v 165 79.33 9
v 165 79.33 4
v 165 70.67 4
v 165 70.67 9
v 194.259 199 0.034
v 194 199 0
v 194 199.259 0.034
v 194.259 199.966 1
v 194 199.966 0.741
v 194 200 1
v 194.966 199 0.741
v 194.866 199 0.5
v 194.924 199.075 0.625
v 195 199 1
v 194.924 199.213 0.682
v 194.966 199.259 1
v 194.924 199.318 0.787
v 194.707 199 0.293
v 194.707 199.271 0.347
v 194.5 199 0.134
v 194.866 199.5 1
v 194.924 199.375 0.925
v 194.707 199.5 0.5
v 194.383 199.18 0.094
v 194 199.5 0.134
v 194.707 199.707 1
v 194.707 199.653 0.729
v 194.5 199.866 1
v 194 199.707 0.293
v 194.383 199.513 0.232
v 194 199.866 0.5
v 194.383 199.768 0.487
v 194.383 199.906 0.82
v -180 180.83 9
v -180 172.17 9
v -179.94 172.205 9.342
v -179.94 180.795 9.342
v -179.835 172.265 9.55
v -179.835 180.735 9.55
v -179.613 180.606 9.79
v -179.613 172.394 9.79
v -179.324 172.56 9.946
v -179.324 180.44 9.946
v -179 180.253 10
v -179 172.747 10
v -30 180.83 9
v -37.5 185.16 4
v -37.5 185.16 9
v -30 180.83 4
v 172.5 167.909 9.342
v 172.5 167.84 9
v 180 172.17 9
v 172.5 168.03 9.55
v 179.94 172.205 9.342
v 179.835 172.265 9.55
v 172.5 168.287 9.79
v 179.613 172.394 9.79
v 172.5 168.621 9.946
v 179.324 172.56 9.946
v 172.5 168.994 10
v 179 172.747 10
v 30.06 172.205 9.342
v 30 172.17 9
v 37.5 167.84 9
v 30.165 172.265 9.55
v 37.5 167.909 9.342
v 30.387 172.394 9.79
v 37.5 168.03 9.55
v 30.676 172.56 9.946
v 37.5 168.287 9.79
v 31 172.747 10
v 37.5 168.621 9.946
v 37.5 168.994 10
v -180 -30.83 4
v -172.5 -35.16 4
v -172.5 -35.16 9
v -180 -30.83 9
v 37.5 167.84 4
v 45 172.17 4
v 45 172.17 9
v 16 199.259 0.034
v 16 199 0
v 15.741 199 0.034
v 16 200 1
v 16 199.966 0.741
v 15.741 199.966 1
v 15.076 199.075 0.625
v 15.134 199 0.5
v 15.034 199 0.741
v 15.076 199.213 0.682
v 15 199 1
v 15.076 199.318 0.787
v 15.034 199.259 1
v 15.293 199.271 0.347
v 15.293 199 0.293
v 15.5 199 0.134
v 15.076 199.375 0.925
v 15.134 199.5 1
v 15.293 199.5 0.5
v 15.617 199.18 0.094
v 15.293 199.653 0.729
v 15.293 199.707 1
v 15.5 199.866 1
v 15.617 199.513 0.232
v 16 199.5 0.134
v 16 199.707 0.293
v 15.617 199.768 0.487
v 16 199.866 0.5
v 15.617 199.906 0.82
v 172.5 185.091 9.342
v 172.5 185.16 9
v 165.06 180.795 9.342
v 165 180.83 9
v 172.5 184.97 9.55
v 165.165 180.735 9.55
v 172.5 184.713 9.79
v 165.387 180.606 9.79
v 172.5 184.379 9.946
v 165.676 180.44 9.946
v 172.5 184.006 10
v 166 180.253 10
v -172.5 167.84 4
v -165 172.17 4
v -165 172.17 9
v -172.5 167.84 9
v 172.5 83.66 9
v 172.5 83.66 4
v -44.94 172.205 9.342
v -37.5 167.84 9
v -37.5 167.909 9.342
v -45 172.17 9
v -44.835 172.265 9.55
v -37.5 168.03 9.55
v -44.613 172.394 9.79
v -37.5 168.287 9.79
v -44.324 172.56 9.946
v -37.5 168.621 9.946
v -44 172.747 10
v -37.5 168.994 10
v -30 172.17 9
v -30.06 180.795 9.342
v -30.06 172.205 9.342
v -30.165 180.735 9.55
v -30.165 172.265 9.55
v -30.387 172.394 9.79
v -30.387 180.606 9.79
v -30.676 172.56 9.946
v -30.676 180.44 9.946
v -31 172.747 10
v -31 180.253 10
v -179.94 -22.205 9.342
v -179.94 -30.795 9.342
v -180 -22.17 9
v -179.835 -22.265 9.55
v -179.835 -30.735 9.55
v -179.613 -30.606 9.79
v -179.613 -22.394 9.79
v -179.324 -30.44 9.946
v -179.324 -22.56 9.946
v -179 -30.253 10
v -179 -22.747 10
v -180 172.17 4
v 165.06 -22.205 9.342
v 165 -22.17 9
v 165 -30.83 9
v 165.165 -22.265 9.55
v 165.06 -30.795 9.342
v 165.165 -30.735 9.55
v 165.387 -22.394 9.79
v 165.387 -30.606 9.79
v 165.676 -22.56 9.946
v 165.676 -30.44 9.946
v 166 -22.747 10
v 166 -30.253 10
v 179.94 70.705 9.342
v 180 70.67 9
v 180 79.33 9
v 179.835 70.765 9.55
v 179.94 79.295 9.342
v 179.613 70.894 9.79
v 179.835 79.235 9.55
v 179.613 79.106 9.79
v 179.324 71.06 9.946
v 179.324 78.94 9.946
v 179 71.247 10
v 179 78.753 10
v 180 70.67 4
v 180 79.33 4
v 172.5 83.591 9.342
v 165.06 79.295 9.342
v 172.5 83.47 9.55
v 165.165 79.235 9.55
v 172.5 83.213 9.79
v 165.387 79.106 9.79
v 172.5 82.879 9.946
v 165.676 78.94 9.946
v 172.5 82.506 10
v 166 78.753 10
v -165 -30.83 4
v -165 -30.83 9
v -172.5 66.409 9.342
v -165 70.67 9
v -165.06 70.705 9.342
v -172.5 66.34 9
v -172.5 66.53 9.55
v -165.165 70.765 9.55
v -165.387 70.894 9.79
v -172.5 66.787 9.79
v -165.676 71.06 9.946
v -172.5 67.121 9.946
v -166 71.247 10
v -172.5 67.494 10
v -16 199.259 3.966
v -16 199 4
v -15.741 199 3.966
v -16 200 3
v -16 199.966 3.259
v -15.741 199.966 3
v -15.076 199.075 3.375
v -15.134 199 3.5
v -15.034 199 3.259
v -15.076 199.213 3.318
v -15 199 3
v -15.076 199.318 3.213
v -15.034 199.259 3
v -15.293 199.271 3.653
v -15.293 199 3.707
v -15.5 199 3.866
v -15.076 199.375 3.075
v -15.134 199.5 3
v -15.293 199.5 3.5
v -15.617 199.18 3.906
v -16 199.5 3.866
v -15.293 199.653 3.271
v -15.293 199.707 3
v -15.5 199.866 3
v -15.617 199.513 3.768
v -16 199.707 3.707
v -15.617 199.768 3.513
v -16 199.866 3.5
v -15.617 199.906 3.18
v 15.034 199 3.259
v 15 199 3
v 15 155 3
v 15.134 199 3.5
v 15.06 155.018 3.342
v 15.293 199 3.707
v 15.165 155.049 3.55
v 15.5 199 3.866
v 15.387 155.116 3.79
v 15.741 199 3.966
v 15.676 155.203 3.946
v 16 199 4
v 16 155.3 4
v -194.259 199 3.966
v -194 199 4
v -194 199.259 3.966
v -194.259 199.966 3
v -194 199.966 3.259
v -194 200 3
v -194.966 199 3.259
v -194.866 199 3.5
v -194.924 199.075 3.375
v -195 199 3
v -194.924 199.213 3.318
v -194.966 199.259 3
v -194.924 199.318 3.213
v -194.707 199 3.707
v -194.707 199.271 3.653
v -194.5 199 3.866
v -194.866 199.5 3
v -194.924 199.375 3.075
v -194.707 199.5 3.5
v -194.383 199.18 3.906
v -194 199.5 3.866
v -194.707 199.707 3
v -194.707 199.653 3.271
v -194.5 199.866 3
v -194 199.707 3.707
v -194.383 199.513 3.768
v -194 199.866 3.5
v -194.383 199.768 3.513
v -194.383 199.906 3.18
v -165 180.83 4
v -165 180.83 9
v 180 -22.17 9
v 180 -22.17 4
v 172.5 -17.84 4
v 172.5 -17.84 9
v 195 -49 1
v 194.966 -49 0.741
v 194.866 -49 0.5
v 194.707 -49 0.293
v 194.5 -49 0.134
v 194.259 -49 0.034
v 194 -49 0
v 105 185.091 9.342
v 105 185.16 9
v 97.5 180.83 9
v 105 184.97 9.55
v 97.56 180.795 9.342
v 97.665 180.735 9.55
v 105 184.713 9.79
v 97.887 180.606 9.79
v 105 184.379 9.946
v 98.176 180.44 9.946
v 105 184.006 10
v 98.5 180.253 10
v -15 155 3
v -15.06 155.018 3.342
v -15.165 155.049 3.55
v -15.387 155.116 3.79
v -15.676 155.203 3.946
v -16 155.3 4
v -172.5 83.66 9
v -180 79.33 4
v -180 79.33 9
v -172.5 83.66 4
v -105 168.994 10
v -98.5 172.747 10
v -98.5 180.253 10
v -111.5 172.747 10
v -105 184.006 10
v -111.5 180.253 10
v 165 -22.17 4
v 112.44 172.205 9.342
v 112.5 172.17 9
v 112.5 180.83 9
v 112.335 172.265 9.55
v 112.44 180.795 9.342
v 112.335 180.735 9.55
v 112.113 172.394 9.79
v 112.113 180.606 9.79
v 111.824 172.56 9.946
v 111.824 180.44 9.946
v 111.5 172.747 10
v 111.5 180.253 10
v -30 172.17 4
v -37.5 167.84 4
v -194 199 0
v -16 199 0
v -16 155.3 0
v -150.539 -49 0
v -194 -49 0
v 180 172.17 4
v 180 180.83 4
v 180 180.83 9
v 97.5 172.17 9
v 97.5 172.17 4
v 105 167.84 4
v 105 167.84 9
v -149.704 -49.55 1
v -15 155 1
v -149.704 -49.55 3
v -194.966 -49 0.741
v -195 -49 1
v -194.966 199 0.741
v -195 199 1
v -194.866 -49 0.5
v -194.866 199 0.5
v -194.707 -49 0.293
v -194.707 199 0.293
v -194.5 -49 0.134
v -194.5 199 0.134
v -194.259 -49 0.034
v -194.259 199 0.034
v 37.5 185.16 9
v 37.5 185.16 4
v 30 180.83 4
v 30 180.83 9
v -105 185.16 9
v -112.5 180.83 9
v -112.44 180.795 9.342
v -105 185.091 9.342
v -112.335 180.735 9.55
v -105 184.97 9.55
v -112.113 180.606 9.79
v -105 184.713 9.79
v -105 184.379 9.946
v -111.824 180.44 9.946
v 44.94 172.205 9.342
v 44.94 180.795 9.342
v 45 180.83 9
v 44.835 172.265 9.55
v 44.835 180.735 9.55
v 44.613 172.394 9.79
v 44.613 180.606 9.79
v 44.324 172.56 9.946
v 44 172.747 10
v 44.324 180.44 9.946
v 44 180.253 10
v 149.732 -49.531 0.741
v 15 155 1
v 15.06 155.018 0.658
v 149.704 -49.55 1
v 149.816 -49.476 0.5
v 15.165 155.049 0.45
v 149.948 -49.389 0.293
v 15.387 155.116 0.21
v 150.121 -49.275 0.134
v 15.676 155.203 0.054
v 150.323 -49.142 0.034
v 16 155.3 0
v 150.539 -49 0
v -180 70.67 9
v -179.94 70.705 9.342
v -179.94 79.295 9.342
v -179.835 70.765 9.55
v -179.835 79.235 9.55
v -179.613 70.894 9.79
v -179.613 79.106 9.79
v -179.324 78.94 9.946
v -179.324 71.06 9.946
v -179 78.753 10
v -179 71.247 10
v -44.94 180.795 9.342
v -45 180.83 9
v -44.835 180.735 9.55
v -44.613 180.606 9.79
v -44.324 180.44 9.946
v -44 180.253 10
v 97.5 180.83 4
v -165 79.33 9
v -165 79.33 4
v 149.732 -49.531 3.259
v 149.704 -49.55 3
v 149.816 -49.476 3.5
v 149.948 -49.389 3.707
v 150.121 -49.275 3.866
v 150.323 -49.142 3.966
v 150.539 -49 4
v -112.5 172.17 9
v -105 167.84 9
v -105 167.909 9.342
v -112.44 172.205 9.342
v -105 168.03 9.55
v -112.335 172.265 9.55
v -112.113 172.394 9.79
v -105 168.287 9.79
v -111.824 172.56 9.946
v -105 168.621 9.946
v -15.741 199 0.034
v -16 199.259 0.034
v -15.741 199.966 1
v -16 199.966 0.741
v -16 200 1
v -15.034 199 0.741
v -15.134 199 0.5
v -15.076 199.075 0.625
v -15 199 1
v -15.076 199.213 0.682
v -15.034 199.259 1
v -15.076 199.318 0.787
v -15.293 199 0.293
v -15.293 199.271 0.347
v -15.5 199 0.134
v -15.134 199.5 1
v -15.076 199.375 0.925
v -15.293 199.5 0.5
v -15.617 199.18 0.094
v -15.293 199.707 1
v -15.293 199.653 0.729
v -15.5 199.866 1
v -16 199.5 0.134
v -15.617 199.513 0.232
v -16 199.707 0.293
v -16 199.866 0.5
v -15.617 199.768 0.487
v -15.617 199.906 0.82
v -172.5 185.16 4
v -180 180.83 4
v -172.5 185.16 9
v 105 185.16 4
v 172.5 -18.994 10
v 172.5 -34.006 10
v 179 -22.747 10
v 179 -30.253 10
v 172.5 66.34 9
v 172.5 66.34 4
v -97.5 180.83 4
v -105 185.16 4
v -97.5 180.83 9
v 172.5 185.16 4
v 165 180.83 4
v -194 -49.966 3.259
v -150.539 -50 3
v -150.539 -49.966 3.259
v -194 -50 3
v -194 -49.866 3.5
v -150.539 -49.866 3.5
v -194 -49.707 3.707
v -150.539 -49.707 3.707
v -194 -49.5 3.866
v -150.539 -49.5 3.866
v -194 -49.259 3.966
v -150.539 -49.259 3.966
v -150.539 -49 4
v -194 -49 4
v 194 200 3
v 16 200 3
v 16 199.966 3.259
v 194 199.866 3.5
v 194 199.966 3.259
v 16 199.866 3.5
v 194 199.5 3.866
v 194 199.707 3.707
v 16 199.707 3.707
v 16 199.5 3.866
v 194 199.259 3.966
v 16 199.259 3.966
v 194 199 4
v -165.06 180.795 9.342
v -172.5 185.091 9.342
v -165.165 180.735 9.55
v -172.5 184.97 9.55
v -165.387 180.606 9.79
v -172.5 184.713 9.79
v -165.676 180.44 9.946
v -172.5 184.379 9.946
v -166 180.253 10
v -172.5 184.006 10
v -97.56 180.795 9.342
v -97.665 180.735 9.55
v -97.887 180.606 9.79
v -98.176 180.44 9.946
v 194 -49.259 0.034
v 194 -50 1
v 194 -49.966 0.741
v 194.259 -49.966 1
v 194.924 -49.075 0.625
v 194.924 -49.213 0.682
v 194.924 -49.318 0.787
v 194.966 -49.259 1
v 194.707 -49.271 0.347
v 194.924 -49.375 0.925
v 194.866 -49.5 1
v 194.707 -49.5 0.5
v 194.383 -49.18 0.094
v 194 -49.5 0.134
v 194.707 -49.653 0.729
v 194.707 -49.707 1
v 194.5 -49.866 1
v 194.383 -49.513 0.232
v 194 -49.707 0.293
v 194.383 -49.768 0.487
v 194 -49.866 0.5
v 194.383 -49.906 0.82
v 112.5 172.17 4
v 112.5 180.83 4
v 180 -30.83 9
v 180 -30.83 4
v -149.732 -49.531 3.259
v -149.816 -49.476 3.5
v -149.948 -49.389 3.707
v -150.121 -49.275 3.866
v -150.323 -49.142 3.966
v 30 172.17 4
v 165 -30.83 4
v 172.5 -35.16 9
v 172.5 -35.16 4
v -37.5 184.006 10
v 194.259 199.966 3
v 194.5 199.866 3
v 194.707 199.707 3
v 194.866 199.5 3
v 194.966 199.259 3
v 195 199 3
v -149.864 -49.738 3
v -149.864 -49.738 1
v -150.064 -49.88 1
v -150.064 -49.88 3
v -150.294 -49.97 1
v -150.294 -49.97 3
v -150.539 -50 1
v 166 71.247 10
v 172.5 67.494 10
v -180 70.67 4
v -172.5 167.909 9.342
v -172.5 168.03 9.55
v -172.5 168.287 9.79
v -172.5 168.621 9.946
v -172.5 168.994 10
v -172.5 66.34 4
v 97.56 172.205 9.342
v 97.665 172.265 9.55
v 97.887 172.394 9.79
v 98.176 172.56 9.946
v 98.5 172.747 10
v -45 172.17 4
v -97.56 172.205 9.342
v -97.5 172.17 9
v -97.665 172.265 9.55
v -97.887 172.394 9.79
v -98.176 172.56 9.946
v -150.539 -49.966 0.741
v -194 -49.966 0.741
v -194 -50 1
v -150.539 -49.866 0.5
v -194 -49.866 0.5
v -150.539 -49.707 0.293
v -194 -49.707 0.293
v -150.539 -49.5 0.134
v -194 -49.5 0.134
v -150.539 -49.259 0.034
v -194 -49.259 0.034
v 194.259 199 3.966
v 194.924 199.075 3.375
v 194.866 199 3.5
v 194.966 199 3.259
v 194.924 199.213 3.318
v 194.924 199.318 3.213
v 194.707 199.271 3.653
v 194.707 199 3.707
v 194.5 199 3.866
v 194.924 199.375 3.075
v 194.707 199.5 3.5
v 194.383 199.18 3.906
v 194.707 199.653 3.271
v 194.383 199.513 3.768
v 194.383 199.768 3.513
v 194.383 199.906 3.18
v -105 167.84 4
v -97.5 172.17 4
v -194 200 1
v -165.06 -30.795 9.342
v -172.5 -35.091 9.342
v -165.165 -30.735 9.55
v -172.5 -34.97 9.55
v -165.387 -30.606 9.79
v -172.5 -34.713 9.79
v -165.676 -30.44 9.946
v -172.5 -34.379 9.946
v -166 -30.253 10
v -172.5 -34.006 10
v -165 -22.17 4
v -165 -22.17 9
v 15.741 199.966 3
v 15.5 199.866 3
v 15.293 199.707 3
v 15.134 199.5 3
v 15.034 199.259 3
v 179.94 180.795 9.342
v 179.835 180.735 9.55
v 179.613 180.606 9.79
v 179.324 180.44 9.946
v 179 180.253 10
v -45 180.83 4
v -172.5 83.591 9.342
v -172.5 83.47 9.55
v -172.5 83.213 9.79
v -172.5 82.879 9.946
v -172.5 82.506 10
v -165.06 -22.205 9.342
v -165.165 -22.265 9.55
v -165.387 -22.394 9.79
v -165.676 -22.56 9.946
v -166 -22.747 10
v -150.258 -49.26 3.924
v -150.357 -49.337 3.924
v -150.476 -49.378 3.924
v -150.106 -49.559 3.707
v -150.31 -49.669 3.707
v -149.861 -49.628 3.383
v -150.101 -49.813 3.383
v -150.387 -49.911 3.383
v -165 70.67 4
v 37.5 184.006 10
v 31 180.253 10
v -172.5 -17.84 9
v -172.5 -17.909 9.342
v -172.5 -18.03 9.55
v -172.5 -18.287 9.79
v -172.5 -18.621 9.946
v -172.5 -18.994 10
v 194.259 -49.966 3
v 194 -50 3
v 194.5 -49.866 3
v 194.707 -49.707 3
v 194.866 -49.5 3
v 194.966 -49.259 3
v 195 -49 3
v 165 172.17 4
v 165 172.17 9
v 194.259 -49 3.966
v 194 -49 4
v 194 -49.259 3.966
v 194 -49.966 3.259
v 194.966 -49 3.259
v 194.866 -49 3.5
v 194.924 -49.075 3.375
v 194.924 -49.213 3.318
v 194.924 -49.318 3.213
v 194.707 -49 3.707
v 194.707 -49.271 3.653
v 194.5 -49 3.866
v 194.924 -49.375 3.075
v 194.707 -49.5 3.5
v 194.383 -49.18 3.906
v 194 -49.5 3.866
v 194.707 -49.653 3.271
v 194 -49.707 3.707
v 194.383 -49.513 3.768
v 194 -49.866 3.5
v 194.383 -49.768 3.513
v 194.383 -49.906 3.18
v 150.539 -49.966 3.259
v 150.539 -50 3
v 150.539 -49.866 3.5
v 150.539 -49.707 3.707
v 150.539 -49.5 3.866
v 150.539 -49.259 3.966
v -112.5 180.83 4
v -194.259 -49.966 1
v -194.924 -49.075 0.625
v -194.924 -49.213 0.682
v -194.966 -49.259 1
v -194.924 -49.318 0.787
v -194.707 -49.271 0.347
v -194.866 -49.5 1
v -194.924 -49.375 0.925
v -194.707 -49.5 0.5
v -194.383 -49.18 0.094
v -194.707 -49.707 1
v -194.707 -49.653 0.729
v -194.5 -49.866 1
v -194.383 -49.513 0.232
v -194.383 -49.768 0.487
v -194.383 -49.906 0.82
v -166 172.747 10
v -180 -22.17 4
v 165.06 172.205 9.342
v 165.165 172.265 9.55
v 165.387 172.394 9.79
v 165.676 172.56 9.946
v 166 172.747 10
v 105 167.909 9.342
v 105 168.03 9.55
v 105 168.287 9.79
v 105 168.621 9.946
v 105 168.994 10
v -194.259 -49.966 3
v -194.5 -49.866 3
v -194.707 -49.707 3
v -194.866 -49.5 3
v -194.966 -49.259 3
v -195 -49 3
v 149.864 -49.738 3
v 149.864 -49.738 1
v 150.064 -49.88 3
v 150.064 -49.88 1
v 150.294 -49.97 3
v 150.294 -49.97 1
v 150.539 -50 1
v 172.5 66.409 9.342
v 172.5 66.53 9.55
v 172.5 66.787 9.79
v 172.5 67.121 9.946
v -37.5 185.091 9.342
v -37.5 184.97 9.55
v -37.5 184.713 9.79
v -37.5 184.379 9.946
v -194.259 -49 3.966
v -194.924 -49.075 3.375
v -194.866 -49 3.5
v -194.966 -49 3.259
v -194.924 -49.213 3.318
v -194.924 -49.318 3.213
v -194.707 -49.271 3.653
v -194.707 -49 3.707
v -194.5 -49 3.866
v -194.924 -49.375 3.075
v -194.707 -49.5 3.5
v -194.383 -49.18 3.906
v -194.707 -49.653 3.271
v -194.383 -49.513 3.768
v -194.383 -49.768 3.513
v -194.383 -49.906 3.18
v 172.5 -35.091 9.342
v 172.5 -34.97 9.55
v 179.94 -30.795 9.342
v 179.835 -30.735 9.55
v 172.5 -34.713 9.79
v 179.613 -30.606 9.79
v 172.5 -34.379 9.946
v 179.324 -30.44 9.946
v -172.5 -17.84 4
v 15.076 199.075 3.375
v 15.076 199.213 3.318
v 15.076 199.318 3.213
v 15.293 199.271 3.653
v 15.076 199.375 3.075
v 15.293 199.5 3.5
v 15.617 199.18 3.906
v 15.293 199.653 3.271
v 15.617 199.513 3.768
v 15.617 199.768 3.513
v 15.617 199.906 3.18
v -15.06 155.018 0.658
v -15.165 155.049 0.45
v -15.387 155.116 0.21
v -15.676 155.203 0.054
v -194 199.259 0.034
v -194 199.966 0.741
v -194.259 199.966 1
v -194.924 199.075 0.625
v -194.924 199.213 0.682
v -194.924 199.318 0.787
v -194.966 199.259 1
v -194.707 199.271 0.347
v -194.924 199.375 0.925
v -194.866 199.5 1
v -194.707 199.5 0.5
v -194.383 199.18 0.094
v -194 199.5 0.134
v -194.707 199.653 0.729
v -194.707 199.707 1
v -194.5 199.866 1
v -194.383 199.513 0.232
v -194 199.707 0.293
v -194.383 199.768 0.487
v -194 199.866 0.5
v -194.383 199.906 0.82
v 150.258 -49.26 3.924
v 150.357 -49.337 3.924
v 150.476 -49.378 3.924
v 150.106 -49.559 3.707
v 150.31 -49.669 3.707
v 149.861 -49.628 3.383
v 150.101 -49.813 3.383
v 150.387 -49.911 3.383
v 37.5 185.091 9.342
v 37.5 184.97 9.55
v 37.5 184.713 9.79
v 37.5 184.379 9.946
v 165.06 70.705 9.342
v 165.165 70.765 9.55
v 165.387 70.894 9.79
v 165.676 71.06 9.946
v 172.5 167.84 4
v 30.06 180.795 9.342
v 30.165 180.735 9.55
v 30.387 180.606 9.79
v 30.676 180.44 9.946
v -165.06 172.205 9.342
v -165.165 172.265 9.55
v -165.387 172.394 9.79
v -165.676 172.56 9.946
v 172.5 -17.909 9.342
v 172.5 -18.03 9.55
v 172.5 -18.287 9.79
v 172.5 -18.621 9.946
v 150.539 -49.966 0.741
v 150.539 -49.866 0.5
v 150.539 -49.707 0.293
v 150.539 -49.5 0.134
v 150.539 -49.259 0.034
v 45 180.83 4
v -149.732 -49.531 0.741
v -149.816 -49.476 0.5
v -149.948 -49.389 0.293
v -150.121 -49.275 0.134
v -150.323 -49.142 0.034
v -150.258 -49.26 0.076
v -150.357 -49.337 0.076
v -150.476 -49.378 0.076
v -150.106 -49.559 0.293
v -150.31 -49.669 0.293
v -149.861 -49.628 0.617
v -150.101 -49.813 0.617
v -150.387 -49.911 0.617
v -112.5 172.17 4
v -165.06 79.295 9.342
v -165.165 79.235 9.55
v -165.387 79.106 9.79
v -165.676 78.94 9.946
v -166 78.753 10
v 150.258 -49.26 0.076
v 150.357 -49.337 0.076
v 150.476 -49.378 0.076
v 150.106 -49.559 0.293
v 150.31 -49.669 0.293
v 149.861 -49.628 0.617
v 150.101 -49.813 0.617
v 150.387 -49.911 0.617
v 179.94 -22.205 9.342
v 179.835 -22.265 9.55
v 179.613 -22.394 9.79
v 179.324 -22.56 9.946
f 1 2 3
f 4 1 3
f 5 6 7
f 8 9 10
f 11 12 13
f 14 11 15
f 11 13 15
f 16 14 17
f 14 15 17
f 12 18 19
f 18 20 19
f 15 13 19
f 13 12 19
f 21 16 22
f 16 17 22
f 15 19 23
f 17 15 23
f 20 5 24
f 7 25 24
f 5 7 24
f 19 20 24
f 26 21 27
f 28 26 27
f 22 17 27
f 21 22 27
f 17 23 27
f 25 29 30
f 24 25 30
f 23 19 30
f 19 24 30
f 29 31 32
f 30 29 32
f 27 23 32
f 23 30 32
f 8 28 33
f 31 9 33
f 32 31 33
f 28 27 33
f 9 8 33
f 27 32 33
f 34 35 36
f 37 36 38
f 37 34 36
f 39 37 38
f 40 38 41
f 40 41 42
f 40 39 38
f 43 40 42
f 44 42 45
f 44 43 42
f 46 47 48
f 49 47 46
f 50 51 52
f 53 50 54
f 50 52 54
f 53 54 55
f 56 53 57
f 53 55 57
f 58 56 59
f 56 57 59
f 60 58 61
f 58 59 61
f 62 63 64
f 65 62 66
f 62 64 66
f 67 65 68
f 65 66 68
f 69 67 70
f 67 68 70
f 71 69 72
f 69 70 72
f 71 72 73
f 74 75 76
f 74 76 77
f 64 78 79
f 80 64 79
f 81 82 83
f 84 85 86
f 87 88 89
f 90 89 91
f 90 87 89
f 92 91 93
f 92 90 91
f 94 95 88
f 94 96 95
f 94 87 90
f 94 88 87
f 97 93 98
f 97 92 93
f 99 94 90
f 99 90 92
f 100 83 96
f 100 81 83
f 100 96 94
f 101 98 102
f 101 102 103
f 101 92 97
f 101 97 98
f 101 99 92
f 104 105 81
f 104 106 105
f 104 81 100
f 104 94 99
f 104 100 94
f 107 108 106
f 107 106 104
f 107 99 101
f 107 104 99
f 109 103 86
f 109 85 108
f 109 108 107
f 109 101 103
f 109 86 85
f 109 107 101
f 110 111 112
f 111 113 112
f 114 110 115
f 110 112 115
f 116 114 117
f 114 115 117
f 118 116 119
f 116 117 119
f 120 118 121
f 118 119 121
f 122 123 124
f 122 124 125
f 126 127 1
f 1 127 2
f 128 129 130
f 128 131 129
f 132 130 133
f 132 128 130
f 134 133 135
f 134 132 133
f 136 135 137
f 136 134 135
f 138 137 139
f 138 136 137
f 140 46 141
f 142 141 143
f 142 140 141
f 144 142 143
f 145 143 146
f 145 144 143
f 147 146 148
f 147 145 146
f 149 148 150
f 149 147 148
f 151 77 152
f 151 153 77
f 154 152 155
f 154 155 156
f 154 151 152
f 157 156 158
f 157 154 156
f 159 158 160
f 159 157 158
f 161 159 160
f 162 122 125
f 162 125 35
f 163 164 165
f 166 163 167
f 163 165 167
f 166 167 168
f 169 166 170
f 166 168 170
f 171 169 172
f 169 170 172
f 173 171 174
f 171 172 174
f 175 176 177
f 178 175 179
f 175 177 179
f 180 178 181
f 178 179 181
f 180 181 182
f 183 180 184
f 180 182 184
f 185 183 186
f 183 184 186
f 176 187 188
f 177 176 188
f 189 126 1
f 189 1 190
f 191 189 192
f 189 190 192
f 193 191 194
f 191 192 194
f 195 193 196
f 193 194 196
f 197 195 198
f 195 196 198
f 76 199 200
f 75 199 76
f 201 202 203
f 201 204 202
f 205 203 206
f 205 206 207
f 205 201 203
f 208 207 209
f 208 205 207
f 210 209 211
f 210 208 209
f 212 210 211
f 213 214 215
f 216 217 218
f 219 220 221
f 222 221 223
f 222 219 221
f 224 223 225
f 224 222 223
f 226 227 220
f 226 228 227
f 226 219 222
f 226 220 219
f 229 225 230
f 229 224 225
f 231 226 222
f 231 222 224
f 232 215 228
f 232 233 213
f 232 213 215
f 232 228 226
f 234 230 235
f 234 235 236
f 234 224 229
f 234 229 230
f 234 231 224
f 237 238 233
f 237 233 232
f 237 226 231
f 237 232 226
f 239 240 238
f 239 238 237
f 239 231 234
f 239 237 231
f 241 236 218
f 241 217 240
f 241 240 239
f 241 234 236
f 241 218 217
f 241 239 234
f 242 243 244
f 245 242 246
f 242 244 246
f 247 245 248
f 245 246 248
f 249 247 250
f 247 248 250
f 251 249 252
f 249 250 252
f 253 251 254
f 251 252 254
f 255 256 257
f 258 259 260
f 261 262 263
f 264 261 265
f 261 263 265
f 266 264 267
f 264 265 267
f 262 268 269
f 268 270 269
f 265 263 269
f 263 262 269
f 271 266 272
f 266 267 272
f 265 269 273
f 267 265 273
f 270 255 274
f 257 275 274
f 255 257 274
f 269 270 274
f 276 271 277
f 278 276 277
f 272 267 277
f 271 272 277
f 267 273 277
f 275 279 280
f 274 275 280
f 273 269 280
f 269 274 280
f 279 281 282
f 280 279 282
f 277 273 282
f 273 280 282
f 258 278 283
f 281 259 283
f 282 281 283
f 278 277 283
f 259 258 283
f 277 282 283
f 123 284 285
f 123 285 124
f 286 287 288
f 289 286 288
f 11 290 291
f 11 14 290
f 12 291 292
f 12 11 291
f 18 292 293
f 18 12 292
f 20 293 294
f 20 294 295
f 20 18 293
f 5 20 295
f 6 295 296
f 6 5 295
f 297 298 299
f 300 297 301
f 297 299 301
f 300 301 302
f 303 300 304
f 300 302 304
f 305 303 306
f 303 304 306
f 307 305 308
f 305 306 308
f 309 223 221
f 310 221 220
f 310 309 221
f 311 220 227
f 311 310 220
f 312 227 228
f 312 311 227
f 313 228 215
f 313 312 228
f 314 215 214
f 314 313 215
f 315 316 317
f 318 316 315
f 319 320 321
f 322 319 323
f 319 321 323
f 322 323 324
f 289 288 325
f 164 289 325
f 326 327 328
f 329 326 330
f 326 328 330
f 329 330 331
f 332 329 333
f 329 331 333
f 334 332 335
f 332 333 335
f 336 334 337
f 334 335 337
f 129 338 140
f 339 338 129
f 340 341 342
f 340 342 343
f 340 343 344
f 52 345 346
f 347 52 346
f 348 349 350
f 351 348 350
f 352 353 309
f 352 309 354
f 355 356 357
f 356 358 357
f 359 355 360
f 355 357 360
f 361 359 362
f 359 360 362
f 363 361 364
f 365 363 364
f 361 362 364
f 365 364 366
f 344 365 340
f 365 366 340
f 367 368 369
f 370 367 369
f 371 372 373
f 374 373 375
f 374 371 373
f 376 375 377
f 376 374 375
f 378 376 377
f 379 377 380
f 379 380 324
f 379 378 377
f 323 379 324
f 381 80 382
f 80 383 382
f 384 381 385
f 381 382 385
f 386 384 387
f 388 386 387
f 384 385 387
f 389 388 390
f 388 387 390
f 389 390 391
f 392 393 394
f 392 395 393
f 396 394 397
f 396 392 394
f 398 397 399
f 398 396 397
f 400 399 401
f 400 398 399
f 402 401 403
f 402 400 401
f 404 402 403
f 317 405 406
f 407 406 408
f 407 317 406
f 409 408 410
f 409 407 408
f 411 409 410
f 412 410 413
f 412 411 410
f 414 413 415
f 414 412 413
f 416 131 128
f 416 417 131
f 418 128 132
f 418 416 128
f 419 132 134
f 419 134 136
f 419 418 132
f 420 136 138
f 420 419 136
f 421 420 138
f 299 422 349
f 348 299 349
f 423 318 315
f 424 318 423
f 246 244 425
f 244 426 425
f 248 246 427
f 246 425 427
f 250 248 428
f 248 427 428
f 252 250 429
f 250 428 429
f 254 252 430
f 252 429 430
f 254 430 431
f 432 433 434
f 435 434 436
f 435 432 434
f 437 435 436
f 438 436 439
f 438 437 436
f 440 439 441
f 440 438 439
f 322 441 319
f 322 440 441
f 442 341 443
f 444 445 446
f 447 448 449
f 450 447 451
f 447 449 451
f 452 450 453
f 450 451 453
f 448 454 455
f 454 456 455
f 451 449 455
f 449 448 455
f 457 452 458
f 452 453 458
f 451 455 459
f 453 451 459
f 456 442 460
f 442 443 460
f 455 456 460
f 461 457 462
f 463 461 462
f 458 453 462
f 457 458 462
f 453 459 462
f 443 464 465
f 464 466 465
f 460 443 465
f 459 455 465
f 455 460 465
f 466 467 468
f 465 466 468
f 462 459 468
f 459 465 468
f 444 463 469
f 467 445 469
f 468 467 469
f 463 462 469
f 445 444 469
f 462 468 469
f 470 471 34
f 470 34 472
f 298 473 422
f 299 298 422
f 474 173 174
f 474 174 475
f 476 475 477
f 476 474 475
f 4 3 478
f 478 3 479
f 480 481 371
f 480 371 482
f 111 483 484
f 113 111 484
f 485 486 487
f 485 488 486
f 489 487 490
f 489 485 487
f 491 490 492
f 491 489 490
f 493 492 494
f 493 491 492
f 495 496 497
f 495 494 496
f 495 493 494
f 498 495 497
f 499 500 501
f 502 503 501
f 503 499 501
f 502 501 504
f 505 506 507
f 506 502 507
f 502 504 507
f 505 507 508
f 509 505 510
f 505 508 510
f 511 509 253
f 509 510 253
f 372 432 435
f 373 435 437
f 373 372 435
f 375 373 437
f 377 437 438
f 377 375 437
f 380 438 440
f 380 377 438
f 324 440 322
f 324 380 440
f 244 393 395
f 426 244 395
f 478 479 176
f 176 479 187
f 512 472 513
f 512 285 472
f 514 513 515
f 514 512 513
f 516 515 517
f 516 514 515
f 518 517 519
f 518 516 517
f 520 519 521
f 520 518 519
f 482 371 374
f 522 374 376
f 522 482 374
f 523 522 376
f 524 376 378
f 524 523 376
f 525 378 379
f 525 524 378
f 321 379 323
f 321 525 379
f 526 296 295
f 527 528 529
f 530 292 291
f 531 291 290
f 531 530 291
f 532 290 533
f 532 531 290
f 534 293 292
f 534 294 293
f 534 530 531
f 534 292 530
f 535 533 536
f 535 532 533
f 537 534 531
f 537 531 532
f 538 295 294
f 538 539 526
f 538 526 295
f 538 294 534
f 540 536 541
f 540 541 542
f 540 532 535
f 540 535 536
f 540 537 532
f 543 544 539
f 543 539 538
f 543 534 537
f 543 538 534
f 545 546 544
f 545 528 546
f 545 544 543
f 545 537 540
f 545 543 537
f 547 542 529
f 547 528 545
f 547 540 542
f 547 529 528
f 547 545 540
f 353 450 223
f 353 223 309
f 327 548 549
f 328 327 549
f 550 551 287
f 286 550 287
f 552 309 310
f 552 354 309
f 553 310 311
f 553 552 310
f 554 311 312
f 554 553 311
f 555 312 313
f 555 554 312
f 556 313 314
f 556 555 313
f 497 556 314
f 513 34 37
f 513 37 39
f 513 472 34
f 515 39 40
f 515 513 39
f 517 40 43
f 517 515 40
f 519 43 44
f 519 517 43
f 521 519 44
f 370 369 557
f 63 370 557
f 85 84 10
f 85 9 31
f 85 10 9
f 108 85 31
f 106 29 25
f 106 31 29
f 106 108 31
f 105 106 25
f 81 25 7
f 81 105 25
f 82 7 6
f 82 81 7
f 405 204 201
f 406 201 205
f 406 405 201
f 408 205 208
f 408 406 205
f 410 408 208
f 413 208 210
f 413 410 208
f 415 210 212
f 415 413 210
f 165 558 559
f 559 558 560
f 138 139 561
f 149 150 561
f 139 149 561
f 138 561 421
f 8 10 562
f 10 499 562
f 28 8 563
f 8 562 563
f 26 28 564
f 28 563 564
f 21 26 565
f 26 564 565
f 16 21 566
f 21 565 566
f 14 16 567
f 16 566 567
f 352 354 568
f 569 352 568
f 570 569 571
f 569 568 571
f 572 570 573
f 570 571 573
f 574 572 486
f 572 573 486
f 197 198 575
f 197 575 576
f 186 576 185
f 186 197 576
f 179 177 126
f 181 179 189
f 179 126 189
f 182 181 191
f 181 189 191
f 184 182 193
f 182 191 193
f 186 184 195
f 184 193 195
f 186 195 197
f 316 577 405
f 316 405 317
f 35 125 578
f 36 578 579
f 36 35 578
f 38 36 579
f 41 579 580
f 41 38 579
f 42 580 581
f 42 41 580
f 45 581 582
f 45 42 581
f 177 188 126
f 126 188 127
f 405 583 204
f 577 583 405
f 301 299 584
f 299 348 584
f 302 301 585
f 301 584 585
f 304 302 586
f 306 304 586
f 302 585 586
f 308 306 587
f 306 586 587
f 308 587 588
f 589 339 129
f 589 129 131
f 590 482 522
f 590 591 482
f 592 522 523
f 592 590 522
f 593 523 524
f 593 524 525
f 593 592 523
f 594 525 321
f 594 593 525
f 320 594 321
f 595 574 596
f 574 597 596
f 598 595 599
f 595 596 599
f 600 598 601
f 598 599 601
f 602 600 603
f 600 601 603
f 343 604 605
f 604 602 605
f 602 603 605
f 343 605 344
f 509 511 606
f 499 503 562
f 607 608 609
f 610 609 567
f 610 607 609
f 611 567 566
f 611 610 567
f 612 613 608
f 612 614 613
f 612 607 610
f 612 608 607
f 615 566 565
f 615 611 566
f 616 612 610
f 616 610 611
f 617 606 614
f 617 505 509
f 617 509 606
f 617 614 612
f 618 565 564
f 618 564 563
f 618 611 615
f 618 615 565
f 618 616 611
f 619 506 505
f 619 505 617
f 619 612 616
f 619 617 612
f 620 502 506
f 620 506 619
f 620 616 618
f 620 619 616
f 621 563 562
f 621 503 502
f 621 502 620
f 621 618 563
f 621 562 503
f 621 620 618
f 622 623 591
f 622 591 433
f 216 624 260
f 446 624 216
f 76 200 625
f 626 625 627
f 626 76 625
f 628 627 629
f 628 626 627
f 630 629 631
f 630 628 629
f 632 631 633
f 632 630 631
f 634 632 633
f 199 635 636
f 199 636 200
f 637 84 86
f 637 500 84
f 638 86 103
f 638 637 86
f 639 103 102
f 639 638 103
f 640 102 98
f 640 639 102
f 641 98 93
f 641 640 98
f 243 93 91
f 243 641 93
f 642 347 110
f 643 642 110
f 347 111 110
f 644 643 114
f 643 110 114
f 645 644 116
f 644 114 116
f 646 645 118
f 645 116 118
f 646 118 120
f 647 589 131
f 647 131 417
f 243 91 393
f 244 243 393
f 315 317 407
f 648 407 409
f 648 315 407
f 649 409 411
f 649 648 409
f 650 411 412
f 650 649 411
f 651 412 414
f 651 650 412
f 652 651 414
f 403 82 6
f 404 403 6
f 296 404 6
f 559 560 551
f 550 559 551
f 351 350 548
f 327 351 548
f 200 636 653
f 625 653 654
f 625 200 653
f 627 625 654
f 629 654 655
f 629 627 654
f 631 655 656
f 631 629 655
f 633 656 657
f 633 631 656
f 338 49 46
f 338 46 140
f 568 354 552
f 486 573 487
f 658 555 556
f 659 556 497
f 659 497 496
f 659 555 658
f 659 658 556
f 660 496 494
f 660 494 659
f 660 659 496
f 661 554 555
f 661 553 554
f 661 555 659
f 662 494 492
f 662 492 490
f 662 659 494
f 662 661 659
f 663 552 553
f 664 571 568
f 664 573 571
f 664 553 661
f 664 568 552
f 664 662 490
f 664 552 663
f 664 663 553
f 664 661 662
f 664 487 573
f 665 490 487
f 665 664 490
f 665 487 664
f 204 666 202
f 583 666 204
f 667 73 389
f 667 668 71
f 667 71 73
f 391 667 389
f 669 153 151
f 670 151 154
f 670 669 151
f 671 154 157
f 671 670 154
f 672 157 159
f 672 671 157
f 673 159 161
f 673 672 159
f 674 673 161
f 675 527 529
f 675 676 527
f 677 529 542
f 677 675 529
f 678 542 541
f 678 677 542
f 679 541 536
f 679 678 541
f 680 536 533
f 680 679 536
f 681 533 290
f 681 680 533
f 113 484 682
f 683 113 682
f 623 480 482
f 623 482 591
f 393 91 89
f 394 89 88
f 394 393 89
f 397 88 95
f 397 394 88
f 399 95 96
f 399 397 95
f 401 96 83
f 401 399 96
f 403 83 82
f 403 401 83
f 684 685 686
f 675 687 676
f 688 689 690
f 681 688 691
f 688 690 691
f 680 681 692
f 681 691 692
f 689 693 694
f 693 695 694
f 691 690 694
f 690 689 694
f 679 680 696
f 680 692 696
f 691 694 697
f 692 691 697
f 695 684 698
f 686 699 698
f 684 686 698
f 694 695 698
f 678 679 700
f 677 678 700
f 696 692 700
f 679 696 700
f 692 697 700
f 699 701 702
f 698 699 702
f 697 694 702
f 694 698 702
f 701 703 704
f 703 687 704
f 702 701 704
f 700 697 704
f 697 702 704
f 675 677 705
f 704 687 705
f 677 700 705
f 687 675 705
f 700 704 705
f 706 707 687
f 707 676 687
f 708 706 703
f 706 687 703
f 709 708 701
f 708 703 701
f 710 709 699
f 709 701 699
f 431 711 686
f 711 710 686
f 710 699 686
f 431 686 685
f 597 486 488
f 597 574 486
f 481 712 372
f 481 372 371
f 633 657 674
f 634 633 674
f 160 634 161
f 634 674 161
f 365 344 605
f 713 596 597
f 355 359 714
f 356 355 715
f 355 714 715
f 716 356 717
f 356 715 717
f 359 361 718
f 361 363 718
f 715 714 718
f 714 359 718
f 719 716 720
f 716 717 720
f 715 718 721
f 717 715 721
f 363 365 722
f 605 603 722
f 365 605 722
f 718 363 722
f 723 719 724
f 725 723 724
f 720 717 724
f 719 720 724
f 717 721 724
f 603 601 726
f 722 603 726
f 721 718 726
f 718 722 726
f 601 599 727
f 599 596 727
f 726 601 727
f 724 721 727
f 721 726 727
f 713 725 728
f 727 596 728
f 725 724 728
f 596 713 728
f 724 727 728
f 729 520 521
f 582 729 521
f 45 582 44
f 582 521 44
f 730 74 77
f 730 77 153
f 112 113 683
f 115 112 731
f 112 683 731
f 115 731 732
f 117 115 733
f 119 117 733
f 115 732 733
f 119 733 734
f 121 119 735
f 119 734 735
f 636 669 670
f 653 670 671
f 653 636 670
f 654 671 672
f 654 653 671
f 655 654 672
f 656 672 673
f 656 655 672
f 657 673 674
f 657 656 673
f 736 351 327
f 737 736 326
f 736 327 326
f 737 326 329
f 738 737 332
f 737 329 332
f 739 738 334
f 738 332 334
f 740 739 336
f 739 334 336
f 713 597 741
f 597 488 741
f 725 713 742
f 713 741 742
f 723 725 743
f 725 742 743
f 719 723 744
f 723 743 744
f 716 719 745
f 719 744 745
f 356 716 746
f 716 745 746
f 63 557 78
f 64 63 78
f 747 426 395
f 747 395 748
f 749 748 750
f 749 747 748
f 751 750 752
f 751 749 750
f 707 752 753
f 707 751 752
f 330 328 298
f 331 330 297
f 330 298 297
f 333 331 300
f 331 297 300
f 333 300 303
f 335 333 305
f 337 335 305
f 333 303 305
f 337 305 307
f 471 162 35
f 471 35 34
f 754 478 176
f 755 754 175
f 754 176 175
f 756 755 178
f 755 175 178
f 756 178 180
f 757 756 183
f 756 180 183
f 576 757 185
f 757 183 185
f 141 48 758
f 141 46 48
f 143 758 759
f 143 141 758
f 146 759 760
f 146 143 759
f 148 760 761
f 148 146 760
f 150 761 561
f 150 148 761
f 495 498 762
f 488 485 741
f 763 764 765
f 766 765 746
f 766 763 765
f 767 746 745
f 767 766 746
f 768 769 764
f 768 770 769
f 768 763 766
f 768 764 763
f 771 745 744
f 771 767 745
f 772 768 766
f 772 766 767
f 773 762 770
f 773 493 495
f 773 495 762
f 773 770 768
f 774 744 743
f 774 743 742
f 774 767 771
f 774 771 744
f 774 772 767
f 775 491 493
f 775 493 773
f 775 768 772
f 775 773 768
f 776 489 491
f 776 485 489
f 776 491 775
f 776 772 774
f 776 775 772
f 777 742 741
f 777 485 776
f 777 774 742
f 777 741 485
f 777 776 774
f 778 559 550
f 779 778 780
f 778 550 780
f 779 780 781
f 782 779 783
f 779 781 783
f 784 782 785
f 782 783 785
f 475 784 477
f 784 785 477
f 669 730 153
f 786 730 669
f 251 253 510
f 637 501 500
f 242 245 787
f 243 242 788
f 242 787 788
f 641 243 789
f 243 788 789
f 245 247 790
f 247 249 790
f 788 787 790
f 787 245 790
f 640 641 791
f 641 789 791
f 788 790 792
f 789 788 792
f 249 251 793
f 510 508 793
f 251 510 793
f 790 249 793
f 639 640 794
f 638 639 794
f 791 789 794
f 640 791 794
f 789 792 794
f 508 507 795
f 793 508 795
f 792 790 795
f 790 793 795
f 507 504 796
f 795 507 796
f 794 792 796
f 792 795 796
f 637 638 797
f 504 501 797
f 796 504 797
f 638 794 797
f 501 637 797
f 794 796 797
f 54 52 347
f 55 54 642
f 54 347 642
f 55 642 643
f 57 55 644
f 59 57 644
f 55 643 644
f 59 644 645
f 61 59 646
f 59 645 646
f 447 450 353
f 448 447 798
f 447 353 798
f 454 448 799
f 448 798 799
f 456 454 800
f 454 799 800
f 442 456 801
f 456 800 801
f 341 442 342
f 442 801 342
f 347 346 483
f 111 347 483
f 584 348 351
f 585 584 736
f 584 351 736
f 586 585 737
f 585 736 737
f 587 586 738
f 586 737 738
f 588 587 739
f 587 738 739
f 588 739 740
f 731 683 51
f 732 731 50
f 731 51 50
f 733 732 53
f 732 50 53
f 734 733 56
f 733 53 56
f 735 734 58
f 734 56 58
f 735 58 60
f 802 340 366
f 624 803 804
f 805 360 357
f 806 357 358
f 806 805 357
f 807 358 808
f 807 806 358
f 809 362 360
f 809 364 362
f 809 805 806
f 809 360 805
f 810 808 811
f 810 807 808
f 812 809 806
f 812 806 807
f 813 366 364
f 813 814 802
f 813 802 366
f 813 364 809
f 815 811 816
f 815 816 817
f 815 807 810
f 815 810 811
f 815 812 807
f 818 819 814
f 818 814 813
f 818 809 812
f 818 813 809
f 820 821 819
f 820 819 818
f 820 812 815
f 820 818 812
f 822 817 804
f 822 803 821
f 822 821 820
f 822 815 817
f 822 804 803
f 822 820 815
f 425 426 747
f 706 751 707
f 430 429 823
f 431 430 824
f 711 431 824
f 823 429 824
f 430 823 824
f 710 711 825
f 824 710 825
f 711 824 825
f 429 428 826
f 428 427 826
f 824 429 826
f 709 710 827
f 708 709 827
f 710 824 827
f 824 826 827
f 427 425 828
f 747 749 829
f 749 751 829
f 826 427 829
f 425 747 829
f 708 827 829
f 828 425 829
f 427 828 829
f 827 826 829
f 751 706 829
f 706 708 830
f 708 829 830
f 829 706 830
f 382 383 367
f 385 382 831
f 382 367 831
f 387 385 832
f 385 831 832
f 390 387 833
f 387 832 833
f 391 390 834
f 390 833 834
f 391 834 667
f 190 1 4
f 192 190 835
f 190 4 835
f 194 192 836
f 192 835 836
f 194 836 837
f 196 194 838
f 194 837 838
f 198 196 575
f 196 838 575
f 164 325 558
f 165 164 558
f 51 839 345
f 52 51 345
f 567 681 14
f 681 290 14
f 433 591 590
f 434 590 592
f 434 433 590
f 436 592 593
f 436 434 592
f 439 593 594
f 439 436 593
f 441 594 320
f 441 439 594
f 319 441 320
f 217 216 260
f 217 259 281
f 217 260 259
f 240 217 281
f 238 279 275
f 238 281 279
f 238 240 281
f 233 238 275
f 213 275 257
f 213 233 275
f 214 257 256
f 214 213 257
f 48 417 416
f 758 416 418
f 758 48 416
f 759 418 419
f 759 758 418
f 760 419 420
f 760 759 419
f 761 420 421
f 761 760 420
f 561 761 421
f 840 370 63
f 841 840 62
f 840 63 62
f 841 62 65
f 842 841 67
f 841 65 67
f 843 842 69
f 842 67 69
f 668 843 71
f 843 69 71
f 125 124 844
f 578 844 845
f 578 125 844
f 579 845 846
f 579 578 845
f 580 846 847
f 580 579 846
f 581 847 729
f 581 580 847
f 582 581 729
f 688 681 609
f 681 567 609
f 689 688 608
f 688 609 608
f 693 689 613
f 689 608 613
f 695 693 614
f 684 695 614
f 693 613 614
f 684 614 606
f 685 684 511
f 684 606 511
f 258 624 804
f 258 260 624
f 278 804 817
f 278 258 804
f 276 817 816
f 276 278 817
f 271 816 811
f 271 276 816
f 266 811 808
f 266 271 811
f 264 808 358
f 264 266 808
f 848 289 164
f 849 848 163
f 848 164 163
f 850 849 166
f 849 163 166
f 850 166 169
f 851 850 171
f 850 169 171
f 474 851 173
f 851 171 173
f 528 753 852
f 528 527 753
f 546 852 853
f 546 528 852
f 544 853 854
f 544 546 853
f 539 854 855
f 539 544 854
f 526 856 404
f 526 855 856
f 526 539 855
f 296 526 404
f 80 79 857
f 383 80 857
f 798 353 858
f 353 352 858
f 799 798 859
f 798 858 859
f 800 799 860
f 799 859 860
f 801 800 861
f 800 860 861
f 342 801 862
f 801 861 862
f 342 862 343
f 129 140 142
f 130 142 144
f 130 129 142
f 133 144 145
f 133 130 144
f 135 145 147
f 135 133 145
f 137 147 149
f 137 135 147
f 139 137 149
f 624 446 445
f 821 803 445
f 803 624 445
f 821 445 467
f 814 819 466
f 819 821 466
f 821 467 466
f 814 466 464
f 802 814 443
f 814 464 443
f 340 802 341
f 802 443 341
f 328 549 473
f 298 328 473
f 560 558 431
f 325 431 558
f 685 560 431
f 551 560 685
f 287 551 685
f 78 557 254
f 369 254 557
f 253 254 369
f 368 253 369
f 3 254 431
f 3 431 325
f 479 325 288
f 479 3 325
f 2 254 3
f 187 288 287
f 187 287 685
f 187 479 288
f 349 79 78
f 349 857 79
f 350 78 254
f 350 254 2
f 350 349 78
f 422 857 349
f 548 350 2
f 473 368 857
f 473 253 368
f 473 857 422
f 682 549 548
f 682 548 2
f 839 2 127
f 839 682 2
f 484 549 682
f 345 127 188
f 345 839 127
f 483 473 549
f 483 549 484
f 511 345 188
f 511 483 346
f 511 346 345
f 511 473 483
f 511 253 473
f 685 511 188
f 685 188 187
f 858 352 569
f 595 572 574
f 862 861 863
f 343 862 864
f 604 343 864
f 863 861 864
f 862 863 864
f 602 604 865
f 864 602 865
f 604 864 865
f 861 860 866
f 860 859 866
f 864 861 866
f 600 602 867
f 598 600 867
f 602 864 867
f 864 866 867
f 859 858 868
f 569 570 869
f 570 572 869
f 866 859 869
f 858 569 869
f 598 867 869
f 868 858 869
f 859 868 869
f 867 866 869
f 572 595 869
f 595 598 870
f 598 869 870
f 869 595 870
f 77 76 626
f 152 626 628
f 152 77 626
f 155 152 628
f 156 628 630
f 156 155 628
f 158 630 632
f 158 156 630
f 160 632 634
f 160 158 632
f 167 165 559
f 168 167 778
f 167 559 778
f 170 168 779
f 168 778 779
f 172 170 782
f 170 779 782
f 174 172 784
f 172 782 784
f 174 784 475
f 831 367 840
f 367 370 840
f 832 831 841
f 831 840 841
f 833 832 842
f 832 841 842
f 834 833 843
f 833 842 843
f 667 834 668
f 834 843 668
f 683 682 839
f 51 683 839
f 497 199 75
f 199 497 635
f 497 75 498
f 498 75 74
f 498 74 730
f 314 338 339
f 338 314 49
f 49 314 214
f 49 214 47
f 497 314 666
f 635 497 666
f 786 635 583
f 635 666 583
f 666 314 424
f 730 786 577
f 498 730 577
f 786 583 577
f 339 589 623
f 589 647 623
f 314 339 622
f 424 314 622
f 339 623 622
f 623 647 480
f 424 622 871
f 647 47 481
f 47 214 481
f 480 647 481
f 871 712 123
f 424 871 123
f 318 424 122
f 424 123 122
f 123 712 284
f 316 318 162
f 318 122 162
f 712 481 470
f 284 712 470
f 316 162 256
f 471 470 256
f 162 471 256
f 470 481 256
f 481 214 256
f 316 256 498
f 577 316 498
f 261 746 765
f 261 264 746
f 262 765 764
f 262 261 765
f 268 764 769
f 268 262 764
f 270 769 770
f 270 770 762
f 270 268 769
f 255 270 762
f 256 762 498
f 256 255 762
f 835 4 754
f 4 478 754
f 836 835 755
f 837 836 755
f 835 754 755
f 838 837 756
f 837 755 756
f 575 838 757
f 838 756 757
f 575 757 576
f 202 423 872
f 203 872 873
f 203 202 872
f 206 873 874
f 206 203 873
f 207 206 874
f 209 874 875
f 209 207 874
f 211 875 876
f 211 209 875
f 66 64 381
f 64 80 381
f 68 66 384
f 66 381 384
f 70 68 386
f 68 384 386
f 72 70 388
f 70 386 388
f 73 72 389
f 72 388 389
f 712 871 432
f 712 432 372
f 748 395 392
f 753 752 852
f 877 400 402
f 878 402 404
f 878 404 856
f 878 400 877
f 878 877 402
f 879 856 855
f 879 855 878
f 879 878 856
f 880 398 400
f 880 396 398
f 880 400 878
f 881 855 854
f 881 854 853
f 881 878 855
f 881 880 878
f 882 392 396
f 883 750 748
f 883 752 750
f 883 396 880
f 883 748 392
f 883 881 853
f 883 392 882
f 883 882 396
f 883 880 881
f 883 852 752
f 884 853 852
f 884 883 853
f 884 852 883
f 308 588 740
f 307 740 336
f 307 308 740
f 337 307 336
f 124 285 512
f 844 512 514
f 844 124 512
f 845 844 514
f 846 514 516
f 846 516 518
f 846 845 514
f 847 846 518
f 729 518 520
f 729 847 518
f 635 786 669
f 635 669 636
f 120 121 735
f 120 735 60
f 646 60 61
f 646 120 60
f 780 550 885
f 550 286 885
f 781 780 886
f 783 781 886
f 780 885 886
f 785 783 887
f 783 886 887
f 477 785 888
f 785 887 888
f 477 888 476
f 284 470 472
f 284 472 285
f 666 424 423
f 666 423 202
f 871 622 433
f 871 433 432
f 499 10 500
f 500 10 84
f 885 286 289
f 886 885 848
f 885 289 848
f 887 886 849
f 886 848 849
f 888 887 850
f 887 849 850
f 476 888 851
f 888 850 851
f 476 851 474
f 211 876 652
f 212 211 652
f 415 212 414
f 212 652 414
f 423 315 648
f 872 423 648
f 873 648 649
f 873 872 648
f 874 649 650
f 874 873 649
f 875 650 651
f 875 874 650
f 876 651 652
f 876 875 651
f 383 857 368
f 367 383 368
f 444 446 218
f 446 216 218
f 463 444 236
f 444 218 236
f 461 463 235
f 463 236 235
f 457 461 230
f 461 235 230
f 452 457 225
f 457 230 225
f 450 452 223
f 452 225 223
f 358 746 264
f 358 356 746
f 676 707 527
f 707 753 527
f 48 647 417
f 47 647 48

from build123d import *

# Parameters (mm, degrees)
F1_DEPTH = 4
F2_R     = 1
F4_DEPTH = 6
F5_R     = 1


with BuildPart() as f1:
    # F0 (on Top) → F1 (new body)
    with BuildSketch(Plane.XY):
        Polygon((195, 200), (15, 200), (15, 155), (150, -50), (195, -50), align=None)
    extrude(amount=F1_DEPTH)

    # F2
    f2_edges = [f1.edges().sort_by_distance(p)[0] for p in [
        (105, 200, 4),
        (15, 177.5, 4),
        (82.5, 52.5, 4),
        (172.5, -50, 4),
        (195, 75, 4),
        (105, 200, 0),
        (15, 177.5, 0),
        (82.5, 52.5, 0),
        (172.5, -50, 0),
        (195, 75, 0),
        (195, -50, 2),
        (195, 200, 2),
        (15, 200, 2),
        (150, -50, 2),
    ]]
    fillet(f2_edges, radius=F2_R)

    # F3 (on face) → F4 (join)
    with BuildSketch(Plane.XY.offset(4)):
        Polygon((37.5, 167.8397459622), (45, 172.1698729811), (45, 180.8301270189), (37.5, 185.1602540378), (30, 180.8301270189), (30, 172.1698729811), align=None)
        Polygon((112.5, 180.8301270189), (105, 185.1602540378), (97.5, 180.8301270189), (97.5, 172.1698729811), (105, 167.8397459622), (112.5, 172.1698729811), align=None)
        Polygon((180, 180.8301270189), (172.5, 185.1602540378), (165, 180.8301270189), (165, 172.1698729811), (172.5, 167.8397459622), (180, 172.1698729811), align=None)
        Polygon((165, 79.3301270189), (165, 70.6698729811), (172.5, 66.3397459622), (180, 70.6698729811), (180, 79.3301270189), (172.5, 83.6602540378), align=None)
        Polygon((165, -22.1698729811), (165, -30.8301270189), (172.5, -35.1602540378), (180, -30.8301270189), (180, -22.1698729811), (172.5, -17.8397459622), align=None)
    extrude(amount=F4_DEPTH)

    # F5
    f5_edges = [f1.edges().sort_by_distance(p)[0] for p in [
        (165, -26.5, 10),
        (168.75, -32.995191, 10),
        (176.25, -32.995191, 10),
        (180, -26.5, 10),
        (176.25, -20.004809, 10),
        (168.75, -20.004809, 10),
        (165, 75, 10),
        (168.75, 68.504809, 10),
        (176.25, 68.504809, 10),
        (180, 75, 10),
        (176.25, 81.495191, 10),
        (168.75, 81.495191, 10),
        (176.25, 170.004809, 10),
        (180, 176.5, 10),
        (176.25, 182.995191, 10),
        (168.75, 182.995191, 10),
        (165, 176.5, 10),
        (168.75, 170.004809, 10),
        (108.75, 182.995191, 10),
        (101.25, 182.995191, 10),
        (97.5, 176.5, 10),
        (101.25, 170.004809, 10),
        (108.75, 170.004809, 10),
        (112.5, 176.5, 10),
        (41.25, 170.004809, 10),
        (45, 176.5, 10),
        (41.25, 182.995191, 10),
        (33.75, 182.995191, 10),
        (30, 176.5, 10),
        (33.75, 170.004809, 10),
    ]]
    fillet(f5_edges, radius=F5_R)


with BuildPart() as f6_1:
    # F6: instance of F1
    add(f1.part.mirror(Plane.YZ))


solid = Compound([f1.part, f6_1.part])
